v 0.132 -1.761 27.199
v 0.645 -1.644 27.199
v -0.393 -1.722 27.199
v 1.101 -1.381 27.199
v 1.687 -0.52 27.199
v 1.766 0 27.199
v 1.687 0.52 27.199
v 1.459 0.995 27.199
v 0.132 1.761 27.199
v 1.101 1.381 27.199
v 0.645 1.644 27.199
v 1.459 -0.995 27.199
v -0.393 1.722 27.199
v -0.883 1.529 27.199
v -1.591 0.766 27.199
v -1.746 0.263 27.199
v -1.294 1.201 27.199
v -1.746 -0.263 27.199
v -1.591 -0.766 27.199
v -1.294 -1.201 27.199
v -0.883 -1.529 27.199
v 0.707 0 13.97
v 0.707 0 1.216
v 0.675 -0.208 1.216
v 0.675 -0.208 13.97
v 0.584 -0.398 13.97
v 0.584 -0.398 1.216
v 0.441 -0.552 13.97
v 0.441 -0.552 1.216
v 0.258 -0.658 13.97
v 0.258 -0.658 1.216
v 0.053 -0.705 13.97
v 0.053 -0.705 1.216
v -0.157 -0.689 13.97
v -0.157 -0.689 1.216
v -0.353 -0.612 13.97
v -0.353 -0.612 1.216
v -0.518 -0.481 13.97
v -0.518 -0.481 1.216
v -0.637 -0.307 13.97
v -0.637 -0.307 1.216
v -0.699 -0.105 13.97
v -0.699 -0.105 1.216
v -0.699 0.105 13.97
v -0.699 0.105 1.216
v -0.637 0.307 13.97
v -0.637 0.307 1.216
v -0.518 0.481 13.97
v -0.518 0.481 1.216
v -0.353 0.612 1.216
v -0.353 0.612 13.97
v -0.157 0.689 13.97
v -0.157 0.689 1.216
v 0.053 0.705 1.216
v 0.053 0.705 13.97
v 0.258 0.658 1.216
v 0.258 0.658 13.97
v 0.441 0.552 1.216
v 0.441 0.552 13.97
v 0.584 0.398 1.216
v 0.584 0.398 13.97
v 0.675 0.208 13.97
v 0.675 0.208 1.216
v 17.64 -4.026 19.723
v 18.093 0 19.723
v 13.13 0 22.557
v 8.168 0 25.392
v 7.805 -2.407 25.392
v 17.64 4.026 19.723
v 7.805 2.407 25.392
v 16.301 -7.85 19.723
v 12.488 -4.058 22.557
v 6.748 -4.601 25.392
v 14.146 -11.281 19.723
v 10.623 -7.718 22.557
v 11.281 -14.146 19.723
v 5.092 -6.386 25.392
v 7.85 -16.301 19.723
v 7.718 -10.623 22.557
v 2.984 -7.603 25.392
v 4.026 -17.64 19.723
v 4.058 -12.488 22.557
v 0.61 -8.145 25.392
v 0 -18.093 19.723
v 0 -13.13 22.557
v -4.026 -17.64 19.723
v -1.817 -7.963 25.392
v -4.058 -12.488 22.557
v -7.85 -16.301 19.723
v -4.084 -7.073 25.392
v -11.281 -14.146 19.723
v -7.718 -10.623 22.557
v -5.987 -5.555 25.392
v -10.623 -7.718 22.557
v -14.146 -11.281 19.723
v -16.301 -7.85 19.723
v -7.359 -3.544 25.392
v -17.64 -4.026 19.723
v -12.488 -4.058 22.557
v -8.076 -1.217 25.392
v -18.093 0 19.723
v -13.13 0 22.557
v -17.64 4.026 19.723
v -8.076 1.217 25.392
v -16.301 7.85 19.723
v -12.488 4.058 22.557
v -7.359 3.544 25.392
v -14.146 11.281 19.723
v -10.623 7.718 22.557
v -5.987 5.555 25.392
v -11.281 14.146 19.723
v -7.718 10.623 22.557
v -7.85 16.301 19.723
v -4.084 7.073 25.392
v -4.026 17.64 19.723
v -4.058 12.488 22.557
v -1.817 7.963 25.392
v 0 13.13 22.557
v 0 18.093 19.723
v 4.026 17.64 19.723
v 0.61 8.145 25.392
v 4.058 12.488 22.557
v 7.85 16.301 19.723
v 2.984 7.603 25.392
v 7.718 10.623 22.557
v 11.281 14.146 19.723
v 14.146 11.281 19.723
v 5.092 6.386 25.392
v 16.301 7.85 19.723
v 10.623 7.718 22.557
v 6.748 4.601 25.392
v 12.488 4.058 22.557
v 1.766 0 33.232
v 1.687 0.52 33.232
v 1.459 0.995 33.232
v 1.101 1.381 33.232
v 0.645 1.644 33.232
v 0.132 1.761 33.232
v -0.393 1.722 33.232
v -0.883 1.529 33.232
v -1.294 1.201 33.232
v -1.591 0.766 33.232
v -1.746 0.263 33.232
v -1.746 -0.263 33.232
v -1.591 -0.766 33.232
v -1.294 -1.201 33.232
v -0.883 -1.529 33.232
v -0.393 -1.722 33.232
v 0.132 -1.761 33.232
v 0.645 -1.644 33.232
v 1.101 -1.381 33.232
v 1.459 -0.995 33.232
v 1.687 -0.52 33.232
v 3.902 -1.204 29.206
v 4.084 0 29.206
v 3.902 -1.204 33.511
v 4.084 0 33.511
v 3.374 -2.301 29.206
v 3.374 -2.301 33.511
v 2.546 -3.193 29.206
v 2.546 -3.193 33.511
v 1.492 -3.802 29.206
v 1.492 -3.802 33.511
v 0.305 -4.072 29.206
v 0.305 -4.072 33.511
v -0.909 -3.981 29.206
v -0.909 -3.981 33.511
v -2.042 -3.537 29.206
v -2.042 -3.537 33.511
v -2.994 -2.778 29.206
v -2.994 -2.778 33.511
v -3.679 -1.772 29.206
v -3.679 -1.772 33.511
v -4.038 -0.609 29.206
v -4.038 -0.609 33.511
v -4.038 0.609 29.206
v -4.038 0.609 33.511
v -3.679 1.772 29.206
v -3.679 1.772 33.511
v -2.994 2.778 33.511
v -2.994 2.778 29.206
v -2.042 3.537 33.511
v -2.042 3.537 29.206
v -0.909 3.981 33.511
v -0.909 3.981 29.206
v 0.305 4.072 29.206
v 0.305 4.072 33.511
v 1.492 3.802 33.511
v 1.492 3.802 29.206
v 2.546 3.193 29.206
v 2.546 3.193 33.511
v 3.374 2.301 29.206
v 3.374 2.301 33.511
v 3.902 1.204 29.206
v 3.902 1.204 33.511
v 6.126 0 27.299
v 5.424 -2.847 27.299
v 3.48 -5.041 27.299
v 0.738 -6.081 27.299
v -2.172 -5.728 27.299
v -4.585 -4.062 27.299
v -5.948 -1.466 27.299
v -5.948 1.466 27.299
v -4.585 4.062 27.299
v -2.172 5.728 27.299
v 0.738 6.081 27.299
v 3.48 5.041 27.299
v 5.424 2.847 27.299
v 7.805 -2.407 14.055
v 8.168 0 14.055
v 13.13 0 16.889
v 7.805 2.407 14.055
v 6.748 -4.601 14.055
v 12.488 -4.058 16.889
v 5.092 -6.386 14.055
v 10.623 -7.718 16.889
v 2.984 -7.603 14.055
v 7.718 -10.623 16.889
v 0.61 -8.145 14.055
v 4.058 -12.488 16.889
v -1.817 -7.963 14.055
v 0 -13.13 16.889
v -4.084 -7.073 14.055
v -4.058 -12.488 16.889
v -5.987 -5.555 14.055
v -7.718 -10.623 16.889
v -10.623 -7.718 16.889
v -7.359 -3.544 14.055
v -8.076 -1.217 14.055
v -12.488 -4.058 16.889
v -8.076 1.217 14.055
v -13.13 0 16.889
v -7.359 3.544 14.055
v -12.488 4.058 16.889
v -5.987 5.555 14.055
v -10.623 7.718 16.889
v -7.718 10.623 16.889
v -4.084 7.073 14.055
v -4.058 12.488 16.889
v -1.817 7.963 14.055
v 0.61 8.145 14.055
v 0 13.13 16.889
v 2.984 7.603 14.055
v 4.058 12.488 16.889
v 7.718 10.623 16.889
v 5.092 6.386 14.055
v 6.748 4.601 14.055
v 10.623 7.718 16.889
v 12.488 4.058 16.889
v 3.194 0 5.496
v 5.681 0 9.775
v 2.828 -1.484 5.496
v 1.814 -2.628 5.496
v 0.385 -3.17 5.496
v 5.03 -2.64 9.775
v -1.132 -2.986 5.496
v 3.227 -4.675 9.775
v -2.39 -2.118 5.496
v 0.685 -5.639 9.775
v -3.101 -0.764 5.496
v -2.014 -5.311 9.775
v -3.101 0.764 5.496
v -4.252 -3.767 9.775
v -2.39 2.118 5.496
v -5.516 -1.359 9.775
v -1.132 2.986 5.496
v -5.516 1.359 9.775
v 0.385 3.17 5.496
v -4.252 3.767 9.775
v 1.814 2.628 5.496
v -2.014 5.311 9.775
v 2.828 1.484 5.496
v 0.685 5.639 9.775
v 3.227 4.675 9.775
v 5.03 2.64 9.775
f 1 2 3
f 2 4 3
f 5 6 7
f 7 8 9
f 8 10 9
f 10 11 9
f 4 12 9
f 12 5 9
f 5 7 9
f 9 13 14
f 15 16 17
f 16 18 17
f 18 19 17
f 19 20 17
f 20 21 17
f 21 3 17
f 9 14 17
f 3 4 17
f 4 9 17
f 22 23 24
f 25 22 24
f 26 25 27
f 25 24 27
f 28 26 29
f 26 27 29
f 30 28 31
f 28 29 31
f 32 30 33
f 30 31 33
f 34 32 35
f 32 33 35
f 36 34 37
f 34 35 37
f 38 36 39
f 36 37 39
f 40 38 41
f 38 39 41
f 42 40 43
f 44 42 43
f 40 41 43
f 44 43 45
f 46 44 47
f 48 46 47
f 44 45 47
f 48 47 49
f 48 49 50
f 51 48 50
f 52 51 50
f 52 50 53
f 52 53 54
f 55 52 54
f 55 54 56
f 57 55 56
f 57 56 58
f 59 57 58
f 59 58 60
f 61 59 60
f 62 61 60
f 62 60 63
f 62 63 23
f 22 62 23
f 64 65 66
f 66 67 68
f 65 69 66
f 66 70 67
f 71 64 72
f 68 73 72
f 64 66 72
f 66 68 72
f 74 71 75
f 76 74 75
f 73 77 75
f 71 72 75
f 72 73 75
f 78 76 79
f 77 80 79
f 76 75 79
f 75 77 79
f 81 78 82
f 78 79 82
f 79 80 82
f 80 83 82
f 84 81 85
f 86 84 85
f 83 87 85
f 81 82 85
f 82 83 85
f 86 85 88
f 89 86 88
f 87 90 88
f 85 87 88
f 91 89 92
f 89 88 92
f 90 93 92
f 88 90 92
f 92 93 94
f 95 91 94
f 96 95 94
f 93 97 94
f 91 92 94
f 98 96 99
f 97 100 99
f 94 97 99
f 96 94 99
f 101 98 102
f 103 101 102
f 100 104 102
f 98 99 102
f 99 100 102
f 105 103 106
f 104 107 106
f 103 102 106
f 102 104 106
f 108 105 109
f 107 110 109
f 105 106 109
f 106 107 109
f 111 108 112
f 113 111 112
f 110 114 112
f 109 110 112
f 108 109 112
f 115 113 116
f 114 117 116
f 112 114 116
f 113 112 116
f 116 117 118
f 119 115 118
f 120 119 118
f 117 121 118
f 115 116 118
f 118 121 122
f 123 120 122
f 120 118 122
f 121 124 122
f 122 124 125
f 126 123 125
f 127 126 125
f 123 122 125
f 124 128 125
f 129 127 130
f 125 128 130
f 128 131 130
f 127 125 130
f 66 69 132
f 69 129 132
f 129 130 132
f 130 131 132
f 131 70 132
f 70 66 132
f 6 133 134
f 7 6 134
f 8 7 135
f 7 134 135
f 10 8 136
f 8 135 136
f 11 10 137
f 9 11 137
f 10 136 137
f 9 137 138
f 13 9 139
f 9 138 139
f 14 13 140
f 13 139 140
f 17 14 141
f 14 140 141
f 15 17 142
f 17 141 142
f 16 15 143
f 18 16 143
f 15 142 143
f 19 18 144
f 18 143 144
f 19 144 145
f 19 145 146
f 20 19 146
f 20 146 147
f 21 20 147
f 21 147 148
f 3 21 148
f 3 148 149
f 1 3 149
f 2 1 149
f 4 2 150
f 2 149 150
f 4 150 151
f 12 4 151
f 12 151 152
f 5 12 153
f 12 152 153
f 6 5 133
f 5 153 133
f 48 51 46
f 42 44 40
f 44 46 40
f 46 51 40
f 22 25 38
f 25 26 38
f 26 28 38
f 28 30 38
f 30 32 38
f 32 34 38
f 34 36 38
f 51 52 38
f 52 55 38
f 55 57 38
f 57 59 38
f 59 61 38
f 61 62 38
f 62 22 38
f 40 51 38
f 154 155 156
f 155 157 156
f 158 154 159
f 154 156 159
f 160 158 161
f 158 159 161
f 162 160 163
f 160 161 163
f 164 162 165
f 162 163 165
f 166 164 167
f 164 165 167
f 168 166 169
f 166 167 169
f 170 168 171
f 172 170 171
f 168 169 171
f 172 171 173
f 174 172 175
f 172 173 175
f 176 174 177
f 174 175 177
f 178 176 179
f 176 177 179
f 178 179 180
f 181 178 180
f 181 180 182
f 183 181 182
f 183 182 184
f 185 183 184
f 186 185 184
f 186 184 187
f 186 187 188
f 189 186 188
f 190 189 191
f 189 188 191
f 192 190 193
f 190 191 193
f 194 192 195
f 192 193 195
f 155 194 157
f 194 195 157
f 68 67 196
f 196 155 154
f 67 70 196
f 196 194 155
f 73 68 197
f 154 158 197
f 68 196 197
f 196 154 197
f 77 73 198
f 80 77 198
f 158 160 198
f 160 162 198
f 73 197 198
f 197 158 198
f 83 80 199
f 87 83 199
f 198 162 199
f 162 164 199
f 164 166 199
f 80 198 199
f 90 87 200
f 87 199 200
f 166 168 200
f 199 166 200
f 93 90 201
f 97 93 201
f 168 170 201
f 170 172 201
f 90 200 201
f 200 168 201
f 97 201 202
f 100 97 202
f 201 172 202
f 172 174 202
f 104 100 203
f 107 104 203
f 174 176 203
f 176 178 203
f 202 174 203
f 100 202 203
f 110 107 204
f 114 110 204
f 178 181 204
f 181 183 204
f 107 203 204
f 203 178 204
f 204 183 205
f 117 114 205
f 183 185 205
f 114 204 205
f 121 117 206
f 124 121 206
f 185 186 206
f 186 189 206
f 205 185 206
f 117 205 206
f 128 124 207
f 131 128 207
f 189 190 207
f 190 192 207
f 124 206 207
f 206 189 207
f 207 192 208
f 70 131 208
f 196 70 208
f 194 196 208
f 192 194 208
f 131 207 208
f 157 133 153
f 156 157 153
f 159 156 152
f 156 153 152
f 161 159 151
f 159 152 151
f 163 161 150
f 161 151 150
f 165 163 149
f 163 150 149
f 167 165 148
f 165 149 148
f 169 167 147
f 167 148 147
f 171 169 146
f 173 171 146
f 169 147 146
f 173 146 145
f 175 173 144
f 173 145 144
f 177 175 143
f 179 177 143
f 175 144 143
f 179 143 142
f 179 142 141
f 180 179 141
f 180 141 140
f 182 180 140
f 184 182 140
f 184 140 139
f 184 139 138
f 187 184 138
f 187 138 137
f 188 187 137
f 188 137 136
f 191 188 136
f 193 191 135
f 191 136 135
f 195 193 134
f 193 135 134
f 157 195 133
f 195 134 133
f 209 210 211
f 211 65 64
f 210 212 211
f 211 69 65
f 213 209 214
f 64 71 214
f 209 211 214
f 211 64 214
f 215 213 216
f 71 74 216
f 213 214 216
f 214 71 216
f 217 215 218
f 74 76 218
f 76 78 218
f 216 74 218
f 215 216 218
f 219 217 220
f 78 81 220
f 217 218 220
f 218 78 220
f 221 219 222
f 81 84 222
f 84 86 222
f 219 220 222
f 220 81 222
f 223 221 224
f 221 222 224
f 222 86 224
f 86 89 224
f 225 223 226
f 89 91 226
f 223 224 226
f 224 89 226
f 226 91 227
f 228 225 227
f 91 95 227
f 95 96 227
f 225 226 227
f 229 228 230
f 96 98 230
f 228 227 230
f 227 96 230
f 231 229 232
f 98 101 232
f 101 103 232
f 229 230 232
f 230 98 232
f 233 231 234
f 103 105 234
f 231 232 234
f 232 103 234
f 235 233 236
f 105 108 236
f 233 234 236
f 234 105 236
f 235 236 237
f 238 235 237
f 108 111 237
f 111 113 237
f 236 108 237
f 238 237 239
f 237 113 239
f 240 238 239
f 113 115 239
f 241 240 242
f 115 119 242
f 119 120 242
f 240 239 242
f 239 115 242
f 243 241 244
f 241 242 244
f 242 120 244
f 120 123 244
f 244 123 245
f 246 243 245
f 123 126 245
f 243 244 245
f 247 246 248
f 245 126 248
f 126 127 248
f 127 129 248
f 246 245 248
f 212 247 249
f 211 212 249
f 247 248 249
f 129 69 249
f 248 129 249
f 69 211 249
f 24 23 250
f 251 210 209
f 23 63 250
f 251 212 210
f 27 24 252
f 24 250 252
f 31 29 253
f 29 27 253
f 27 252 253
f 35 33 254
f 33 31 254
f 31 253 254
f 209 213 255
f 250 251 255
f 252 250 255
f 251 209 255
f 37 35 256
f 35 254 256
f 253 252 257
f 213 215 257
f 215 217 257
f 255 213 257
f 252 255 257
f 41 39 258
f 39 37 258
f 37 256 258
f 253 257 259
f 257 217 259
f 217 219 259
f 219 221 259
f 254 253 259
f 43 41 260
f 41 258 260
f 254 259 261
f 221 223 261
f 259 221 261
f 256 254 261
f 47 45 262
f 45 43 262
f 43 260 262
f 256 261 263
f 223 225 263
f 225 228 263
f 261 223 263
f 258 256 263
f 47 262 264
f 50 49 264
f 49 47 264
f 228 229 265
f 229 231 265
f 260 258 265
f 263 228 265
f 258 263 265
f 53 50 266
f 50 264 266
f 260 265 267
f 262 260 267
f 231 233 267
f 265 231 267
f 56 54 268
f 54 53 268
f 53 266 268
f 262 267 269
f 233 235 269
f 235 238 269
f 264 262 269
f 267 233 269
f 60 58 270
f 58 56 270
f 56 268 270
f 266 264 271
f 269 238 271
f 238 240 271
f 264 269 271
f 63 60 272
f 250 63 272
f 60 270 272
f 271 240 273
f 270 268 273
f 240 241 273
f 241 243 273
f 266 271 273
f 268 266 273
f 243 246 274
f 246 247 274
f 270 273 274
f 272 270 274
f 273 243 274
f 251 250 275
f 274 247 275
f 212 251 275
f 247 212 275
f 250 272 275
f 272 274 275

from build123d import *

# Parameters (mm, degrees)
F2_W     = 1.7657947028
F2_H     = 4.3581165373
F4_DEPTH = 6.35
F5_W     = 0.7065157406
F5_H     = 3.5888564307
F7_DEPTH = 13.97


with BuildPart() as f1:
    # F0 (on Front) → F1 (revolve)
    with BuildSketch(Plane.XZ):
        Polygon((0, 33.02), (0, 0), (8.1676599603, 14.0551366686), (18.0931817596, 19.7233742263), (8.1676599603, 25.391611784), (4.0838299801, 29.205805892), align=None)
        Polygon((4.0838299801, 33.5109336315), (0, 33.02), (4.0838299801, 29.205805892), align=None)
    revolve(axis=Axis((0, 0, 16.51), (0, 0, -1)))

    # F2 (on Front) → F3 (revolve)
    with BuildSketch(Plane.XZ):
        with Locations((0.8828973514, 31.3695054501)):
            Rectangle(F2_W, F2_H)
    revolve(axis=Axis((0, 0, 31.3695054501), (0, 0, 1)))

    # F4 (cut, symmetric): a face of the model
    f4_faces = [f1.faces().sort_by_distance(p)[0] for p in [
        (0, 0, 33.5485637188),
    ]]
    extrude(f4_faces, amount=F4_DEPTH, both=True, mode=Mode.SUBTRACT)

    # F5 (on Front) → F6 (revolve)
    with BuildSketch(Plane.XZ):
        with Locations((0.3532578703, 1.7944282154)):
            Rectangle(F5_W, F5_H)
    revolve(axis=Axis((0, 0, 1.7944282154), (0, 0, -1)))

    # F7 (cut): a face of the model
    f7_faces = [f1.faces().sort_by_distance(p)[0] for p in [
        (0, 0, 0),
    ]]
    extrude(f7_faces, amount=-F7_DEPTH, mode=Mode.SUBTRACT)


solid = f1.part
